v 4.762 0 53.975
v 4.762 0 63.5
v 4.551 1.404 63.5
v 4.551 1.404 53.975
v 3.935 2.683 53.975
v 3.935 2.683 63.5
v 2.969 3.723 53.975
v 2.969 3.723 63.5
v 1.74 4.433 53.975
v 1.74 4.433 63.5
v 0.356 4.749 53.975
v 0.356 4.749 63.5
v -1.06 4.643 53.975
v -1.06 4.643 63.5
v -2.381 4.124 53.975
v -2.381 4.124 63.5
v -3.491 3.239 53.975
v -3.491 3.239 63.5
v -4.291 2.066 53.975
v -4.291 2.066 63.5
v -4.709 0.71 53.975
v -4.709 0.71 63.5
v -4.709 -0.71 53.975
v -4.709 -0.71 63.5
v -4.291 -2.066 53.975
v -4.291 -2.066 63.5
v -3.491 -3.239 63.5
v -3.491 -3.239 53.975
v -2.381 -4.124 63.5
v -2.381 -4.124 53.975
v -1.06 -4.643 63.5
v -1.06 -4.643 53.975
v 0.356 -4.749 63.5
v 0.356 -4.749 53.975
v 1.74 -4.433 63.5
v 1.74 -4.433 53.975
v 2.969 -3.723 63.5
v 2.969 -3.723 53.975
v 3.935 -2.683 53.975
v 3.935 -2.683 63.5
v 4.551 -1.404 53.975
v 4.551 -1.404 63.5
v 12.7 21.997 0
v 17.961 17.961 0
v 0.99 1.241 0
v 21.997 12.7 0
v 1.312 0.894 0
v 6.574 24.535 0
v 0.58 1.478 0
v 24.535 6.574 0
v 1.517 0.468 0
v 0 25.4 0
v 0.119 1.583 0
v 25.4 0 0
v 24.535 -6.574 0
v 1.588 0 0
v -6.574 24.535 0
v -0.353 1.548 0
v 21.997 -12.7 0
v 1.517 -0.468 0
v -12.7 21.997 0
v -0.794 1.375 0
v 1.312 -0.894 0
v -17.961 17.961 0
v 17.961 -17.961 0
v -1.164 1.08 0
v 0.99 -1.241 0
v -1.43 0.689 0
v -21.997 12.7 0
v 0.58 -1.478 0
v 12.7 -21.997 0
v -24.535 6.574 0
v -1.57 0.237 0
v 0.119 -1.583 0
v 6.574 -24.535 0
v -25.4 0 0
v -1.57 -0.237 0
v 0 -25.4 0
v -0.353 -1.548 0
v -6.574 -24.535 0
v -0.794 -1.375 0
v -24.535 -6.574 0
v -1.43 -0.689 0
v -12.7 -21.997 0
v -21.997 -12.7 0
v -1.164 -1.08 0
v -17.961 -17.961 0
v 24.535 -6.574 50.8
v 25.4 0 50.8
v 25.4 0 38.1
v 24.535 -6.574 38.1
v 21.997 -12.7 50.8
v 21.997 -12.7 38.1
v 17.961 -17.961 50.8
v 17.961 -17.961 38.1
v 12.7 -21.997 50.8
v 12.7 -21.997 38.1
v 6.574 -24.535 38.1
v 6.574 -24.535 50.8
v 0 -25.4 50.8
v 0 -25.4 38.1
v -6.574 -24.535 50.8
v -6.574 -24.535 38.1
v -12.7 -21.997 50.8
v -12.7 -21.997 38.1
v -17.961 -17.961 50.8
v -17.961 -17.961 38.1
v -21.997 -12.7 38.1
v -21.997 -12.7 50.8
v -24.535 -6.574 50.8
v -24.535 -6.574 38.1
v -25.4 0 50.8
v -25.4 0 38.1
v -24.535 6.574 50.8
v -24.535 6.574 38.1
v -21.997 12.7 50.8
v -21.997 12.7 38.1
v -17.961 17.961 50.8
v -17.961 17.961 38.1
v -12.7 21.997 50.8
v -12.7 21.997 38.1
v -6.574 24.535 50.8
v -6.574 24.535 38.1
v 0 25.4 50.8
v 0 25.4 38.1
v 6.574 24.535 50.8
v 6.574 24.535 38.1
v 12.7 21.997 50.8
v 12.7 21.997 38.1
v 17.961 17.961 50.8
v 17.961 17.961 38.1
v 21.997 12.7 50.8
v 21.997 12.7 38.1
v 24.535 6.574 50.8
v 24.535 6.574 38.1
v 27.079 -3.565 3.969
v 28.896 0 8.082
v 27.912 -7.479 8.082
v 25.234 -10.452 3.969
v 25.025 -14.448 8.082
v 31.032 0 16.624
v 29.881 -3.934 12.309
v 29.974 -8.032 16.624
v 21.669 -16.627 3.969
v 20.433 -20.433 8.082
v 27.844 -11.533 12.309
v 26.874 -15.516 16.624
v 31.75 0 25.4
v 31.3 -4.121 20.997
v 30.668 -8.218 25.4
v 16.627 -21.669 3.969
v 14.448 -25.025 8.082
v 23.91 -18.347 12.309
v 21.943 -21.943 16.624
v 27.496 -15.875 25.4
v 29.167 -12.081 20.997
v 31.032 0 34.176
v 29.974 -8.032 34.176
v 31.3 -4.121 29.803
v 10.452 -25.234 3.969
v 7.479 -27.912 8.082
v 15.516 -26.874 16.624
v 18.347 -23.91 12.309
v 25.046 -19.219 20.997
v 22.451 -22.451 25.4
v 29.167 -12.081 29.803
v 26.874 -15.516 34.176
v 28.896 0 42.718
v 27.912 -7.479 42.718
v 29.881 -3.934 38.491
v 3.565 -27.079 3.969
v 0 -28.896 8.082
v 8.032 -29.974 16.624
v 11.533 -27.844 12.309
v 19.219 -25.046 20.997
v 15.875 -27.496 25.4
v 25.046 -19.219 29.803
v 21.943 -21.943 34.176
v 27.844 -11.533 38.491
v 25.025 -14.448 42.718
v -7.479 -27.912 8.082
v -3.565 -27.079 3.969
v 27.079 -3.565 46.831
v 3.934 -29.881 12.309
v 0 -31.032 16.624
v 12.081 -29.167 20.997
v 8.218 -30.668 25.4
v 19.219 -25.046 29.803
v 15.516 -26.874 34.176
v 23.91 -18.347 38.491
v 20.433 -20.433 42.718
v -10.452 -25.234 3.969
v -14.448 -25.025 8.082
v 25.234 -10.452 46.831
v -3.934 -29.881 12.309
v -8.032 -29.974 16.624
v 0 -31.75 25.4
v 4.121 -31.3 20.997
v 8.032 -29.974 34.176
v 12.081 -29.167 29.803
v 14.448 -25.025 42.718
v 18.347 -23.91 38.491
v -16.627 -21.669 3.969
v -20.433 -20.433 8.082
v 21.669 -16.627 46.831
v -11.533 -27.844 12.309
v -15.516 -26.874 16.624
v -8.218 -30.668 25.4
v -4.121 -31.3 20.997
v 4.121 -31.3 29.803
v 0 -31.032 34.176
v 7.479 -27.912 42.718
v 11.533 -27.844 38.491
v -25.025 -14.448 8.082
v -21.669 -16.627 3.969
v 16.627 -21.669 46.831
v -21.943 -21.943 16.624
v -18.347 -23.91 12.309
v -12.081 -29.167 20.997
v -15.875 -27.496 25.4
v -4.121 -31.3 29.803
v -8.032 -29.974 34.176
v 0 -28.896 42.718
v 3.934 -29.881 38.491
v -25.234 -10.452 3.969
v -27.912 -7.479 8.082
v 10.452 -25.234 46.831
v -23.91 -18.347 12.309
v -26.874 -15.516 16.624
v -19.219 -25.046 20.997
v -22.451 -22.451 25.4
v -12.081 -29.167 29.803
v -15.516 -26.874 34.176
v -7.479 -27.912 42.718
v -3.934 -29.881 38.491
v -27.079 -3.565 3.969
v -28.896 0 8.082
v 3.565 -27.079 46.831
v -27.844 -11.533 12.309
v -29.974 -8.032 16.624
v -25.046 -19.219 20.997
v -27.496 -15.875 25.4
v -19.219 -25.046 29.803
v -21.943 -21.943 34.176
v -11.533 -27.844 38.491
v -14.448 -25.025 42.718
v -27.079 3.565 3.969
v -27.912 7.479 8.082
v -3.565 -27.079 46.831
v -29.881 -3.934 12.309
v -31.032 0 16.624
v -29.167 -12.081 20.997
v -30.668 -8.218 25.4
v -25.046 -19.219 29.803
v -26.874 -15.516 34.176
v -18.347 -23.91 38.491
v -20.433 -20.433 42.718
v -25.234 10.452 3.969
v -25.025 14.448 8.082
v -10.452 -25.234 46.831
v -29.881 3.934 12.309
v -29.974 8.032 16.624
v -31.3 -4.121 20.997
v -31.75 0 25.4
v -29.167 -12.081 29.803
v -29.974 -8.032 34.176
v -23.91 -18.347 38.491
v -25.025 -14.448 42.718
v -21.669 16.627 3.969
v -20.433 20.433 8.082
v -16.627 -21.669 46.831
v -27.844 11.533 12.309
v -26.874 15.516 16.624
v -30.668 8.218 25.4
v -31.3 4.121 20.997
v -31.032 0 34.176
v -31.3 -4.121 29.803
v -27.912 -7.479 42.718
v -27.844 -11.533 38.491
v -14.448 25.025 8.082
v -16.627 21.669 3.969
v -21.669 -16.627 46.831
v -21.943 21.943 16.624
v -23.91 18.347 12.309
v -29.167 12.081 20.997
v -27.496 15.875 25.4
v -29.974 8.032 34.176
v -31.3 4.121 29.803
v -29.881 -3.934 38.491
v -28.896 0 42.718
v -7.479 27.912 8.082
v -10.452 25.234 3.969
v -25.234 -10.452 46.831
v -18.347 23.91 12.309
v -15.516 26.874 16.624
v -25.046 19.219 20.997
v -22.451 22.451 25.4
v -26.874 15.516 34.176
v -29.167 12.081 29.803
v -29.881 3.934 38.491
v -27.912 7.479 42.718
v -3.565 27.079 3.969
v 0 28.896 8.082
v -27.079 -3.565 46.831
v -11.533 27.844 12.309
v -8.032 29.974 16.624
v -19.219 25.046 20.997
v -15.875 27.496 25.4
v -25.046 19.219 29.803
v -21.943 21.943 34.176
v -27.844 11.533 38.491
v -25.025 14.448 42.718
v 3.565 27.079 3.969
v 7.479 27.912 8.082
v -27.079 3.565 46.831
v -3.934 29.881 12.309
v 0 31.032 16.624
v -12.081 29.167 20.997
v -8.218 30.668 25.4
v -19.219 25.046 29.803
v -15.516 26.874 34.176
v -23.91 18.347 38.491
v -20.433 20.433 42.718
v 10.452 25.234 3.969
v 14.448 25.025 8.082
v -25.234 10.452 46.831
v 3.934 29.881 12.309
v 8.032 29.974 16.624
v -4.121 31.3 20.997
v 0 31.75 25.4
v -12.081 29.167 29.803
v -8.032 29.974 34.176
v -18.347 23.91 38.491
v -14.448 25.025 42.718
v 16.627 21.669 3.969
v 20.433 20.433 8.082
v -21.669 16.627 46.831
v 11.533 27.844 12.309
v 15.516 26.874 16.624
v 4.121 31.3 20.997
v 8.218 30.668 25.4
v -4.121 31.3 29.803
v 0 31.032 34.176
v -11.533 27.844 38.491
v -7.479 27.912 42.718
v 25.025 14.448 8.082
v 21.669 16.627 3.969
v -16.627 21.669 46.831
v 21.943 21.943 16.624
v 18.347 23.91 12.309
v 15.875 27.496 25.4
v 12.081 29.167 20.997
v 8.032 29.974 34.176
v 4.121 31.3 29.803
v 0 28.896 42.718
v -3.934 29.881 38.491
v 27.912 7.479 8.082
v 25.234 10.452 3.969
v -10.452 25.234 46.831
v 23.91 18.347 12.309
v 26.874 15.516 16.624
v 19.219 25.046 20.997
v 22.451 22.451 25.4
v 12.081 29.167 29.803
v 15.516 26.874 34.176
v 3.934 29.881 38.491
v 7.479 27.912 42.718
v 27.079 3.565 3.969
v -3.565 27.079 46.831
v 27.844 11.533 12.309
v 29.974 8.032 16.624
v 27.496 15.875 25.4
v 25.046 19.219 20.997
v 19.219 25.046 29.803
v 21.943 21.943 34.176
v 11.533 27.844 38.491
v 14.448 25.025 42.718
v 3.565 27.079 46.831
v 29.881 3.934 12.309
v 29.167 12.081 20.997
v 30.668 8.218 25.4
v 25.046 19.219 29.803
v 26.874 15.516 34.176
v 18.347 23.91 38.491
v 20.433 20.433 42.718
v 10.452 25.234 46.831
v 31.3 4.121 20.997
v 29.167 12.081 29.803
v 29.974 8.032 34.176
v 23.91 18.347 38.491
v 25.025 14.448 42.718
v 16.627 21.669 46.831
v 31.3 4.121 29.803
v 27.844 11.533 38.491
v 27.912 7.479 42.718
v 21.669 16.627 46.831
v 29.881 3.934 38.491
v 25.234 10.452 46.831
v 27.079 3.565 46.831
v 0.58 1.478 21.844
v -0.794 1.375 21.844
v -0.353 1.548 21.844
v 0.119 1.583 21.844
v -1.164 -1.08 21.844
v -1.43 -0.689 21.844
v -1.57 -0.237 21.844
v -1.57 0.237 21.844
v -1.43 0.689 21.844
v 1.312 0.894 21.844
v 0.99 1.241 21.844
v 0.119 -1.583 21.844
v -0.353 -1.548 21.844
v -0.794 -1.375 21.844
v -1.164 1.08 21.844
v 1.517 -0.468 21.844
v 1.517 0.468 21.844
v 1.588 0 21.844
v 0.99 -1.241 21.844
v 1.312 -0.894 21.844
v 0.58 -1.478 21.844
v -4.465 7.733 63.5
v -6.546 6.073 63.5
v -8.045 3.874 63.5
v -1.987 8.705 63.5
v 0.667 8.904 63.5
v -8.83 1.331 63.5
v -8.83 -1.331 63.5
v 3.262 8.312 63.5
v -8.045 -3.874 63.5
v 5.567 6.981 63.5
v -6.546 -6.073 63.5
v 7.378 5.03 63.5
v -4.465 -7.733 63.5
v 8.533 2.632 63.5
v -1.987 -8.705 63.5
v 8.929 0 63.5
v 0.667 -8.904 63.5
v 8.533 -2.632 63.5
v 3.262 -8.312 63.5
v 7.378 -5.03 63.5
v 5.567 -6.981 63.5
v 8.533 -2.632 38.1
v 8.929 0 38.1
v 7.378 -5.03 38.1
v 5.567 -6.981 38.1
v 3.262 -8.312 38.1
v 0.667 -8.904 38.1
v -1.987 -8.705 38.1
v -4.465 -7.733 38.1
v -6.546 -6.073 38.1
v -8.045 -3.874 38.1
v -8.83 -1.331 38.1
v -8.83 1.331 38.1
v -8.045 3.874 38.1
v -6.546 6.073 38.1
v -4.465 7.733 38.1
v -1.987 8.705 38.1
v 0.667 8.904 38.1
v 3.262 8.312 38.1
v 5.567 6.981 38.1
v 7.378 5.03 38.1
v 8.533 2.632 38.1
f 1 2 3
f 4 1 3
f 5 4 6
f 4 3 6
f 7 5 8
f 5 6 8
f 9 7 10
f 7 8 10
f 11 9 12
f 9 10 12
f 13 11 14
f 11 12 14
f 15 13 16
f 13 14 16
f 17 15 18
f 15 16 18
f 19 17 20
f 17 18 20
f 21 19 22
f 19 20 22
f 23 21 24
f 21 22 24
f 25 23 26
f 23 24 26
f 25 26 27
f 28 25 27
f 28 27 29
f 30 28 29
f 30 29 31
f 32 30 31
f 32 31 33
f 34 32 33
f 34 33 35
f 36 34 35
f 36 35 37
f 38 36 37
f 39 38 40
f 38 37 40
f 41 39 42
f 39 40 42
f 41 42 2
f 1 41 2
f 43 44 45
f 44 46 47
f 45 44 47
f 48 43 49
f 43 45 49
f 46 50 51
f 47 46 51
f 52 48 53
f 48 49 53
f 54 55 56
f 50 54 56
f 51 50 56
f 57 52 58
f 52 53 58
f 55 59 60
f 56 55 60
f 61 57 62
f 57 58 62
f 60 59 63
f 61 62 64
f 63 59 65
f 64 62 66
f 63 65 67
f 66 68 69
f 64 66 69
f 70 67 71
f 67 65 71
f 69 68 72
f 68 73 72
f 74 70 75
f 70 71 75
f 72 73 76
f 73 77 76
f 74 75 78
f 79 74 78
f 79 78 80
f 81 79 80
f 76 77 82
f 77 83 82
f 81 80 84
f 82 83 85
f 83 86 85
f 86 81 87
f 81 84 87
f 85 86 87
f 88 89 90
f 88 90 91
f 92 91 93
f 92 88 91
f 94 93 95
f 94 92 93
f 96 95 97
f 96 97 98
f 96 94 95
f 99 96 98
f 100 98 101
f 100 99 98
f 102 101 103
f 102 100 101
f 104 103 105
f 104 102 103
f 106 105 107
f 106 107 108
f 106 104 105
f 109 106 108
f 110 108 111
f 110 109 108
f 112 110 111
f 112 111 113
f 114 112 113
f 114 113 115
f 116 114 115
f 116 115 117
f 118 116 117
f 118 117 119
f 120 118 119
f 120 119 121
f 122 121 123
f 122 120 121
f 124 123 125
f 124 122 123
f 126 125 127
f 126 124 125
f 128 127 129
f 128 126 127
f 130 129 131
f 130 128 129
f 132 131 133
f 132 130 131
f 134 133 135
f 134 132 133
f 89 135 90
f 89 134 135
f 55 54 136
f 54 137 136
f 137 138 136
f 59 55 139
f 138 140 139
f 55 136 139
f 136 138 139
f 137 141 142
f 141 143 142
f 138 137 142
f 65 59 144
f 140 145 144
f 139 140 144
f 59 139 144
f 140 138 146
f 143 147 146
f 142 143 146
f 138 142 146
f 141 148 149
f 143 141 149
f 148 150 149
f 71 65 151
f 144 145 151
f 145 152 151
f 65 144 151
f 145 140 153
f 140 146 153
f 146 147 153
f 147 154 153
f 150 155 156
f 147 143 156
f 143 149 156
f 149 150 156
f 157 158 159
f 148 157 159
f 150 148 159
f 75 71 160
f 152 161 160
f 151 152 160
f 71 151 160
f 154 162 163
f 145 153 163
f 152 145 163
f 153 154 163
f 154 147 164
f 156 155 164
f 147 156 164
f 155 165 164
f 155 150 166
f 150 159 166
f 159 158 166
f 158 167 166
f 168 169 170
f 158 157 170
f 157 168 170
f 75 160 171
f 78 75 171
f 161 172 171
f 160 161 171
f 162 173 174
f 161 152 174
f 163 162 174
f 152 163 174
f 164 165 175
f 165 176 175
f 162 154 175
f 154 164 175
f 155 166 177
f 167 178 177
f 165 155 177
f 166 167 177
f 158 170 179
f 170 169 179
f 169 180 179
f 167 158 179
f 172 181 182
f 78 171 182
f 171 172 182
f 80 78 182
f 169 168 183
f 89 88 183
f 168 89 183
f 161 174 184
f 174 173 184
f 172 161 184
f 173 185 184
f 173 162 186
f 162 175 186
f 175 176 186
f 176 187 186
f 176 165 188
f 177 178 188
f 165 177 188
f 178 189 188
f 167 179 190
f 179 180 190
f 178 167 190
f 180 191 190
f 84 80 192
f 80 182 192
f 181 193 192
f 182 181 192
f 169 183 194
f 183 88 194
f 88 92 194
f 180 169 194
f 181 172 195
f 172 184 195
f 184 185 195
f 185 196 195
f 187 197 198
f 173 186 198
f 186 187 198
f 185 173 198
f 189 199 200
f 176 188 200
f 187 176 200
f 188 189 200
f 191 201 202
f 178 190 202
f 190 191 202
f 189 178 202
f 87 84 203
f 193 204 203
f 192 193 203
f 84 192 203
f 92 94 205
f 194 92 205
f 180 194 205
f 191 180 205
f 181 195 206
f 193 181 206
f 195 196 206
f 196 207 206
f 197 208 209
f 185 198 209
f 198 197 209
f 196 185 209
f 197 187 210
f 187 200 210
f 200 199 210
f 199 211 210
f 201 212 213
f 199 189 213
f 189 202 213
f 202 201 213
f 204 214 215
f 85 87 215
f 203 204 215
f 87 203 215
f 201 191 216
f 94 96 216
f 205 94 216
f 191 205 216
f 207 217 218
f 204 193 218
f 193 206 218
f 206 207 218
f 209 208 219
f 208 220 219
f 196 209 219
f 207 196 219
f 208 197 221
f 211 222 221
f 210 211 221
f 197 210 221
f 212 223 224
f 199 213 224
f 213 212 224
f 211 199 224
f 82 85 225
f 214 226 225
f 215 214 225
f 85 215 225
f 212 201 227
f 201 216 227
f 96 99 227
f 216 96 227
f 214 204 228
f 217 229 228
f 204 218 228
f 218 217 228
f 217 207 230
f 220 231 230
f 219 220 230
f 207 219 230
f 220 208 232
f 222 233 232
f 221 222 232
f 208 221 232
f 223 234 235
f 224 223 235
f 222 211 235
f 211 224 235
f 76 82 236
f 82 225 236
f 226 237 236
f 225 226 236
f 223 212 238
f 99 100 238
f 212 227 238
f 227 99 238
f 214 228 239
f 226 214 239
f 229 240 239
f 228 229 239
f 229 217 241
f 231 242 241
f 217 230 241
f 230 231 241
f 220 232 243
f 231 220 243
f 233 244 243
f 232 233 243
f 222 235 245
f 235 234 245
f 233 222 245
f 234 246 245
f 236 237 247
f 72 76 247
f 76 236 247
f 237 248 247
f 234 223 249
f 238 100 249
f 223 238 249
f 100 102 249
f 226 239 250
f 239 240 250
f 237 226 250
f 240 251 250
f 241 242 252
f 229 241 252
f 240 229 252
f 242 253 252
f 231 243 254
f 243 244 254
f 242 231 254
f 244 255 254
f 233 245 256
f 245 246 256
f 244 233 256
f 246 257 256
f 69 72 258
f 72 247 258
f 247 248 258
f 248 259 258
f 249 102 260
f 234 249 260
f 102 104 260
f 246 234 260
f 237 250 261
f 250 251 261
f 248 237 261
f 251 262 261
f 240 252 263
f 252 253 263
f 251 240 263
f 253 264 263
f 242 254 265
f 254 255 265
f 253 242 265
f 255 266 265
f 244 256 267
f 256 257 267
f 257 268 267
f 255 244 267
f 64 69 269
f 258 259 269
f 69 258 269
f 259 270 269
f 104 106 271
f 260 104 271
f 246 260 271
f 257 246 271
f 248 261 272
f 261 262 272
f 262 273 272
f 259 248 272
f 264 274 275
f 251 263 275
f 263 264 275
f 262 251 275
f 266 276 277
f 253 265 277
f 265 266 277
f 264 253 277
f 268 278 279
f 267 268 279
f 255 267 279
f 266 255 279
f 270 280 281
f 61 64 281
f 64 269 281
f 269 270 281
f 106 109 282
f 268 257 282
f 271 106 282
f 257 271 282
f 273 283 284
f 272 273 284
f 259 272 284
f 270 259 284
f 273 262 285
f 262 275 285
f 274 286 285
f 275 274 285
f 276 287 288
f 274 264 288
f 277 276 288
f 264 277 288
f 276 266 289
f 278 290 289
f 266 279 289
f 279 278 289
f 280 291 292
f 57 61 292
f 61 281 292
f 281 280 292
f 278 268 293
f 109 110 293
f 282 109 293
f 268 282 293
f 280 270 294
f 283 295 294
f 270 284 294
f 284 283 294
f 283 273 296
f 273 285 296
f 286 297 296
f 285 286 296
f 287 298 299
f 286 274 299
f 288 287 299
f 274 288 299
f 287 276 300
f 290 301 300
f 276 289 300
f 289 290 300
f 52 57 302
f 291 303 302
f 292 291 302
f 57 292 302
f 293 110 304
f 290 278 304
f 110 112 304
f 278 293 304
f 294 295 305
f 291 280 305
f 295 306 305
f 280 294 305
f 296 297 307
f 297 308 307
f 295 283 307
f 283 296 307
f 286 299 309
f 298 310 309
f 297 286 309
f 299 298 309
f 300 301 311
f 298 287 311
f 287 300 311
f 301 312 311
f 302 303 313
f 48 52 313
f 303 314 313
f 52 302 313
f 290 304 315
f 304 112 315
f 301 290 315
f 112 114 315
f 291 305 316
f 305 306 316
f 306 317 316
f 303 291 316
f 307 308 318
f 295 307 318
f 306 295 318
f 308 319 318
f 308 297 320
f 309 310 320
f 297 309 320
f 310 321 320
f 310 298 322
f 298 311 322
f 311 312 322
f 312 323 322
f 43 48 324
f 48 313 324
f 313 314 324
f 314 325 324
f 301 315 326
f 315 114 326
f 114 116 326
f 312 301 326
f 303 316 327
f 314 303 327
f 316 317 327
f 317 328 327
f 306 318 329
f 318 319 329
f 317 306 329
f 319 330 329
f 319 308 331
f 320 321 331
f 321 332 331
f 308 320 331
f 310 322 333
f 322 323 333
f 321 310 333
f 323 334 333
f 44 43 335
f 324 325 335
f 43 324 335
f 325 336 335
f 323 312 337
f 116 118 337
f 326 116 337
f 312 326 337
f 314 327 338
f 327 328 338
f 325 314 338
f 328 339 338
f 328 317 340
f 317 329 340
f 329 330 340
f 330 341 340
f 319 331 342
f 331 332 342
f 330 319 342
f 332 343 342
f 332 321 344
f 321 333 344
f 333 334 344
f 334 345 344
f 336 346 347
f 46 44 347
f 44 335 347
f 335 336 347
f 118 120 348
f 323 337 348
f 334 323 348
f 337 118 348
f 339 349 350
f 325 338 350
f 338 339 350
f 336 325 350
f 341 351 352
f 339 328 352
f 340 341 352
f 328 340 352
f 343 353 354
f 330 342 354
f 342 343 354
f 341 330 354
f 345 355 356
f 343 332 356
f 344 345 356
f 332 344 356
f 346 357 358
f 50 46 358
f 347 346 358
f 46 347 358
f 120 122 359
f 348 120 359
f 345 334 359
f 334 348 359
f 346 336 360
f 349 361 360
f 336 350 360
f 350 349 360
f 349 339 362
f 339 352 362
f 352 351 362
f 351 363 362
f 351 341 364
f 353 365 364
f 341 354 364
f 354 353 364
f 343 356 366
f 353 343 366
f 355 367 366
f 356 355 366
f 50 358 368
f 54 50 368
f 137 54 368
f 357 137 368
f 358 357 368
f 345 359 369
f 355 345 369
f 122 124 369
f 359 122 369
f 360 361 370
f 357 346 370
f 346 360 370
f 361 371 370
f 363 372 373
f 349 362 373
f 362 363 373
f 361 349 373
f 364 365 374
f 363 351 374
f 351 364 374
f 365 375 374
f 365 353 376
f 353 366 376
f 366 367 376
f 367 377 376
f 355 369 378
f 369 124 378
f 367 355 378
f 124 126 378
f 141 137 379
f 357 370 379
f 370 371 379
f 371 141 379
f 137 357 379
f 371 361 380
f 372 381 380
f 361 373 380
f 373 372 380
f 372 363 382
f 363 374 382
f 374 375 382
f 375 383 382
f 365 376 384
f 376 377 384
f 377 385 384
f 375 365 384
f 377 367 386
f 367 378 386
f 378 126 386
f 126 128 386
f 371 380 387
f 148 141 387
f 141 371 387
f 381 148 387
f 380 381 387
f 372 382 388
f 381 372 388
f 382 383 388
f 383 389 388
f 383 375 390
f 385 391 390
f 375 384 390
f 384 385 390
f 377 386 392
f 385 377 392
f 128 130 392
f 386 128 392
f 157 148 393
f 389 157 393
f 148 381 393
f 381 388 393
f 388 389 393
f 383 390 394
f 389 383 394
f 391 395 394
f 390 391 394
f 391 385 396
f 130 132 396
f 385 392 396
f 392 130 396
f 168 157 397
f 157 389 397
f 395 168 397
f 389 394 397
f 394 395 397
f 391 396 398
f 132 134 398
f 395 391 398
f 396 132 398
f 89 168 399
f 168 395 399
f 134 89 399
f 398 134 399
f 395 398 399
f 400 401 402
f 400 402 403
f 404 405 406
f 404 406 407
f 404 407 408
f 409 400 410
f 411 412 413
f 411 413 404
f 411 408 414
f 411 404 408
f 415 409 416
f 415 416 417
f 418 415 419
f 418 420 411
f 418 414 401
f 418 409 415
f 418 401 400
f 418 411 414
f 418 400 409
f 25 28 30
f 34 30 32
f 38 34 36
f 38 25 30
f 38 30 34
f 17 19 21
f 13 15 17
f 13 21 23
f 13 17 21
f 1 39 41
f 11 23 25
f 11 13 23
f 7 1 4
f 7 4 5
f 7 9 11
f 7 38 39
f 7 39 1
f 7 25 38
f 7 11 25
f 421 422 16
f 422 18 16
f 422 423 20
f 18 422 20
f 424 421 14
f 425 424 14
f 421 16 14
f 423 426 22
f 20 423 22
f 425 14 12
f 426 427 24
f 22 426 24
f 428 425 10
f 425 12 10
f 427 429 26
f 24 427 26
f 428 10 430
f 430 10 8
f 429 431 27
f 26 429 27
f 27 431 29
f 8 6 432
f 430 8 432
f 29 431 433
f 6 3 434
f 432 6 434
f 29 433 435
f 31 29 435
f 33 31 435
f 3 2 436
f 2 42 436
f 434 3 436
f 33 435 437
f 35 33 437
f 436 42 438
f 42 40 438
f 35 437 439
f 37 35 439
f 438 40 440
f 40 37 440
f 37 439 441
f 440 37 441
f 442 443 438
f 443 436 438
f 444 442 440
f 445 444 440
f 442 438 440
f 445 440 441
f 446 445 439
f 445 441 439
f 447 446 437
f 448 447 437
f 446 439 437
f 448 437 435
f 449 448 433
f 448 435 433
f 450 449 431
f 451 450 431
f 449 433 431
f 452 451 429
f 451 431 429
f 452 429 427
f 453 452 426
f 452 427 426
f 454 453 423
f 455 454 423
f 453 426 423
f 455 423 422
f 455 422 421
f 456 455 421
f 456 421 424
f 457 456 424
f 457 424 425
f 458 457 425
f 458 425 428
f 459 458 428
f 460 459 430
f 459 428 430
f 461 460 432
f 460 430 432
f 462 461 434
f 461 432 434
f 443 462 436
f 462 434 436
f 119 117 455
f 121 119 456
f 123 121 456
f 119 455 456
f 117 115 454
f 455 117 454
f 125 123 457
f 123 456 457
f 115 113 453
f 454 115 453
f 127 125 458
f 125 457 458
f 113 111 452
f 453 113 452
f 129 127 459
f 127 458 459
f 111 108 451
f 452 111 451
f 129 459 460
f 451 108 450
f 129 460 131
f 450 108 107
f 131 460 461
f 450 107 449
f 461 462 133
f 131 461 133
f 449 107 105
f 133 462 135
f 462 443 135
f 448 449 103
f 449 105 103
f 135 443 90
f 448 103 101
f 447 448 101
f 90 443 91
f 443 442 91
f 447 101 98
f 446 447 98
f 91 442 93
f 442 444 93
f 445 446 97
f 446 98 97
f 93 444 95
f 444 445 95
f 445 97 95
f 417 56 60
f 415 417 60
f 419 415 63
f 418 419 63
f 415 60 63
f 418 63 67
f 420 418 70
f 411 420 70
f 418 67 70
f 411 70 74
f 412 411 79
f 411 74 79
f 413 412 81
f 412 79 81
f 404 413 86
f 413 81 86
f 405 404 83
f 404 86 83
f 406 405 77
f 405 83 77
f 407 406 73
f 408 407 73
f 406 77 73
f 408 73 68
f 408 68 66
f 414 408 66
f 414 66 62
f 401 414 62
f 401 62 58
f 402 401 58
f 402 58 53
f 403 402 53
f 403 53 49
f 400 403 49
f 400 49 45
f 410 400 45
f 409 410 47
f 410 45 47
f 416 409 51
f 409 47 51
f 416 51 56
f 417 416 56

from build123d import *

# Parameters (mm, degrees)
F3_DEPTH = 12.7
F2_R     = 4.7625
F4_DEPTH = 9.525
F5_R     = 1.5875
F6_DEPTH = 21.844


with BuildPart() as f1:
    # F0 (on Front) → F1 (revolve)
    with BuildSketch(Plane.XZ):
        with BuildLine():
            Line((0, 63.5), (0, 0))
            Line((0, 0), (25.4, 0))
            ThreePointArc((25.4, 0), (31.75, 25.4), (25.4, 50.8))
            Line((25.4, 50.8), (8.9292435173, 50.8))
            Line((8.9292435173, 50.8), (8.9292435173, 63.5))
            Line((8.9292435173, 63.5), (0, 63.5))
        make_face()
    revolve(axis=Axis((0, 0, 31.75), (0, 0, -1)))

    # F3 (cut): a face of the model
    f3_faces = [f1.faces().sort_by_distance(p)[0] for p in [
        (-24.6815795103, 0, 50.8),
    ]]
    extrude(f3_faces, amount=-F3_DEPTH, mode=Mode.SUBTRACT)

    # F2 (on face) → F4 (cut)
    with BuildSketch(Plane.XY.offset(63.5)):
        Circle(F2_R)
    extrude(amount=-F4_DEPTH, mode=Mode.SUBTRACT)

    # F5 (on face) → F6 (cut)
    with BuildSketch(Plane(origin=(0, 0, 0), x_dir=(1, 0, 0), z_dir=(0, 0, -1))):
        Circle(F5_R)
    extrude(amount=-F6_DEPTH, mode=Mode.SUBTRACT)


solid = f1.part
